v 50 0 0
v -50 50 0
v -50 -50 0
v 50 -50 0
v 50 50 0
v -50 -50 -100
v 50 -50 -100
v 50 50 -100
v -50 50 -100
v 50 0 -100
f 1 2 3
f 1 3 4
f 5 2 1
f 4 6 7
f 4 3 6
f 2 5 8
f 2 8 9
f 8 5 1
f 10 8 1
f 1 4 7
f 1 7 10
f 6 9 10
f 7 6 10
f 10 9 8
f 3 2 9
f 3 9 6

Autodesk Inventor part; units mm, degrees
ref_plane "YZ Plane" through (0, 0, 0) normal (1, 0, 0) x (0, 1, 0)
ref_plane "XZ Plane" through (0, 0, 0) normal (0, 1, 0) x (-1, 0, 0)
sketch "Sketch1" plane through (0, 0, 0) normal (0, 0, 1) x (1, 0, 0)
  line L0 (50, 50) -> (50, 0)
  line L1 (-50, -50) -> (50, -50)
  line L2 (50, -50) -> (50, 50)
  line L3 (50, 50) -> (-50, 50)
  line L4 (-50, 50) -> (-50, -50)
  line L5 (-50, -50) -> (50, 50) construction
  line L6 (50, -50) -> (-50, 50) construction
  point P0 (0, 0)
ref_plane "Work Plane1" through (0, 0, -100) normal (0, 0, 1) x (1, 0, 0)
extrude "Extrusion2" add sketch "Sketch1" against normal blind 100
properties part number "Extrude"
